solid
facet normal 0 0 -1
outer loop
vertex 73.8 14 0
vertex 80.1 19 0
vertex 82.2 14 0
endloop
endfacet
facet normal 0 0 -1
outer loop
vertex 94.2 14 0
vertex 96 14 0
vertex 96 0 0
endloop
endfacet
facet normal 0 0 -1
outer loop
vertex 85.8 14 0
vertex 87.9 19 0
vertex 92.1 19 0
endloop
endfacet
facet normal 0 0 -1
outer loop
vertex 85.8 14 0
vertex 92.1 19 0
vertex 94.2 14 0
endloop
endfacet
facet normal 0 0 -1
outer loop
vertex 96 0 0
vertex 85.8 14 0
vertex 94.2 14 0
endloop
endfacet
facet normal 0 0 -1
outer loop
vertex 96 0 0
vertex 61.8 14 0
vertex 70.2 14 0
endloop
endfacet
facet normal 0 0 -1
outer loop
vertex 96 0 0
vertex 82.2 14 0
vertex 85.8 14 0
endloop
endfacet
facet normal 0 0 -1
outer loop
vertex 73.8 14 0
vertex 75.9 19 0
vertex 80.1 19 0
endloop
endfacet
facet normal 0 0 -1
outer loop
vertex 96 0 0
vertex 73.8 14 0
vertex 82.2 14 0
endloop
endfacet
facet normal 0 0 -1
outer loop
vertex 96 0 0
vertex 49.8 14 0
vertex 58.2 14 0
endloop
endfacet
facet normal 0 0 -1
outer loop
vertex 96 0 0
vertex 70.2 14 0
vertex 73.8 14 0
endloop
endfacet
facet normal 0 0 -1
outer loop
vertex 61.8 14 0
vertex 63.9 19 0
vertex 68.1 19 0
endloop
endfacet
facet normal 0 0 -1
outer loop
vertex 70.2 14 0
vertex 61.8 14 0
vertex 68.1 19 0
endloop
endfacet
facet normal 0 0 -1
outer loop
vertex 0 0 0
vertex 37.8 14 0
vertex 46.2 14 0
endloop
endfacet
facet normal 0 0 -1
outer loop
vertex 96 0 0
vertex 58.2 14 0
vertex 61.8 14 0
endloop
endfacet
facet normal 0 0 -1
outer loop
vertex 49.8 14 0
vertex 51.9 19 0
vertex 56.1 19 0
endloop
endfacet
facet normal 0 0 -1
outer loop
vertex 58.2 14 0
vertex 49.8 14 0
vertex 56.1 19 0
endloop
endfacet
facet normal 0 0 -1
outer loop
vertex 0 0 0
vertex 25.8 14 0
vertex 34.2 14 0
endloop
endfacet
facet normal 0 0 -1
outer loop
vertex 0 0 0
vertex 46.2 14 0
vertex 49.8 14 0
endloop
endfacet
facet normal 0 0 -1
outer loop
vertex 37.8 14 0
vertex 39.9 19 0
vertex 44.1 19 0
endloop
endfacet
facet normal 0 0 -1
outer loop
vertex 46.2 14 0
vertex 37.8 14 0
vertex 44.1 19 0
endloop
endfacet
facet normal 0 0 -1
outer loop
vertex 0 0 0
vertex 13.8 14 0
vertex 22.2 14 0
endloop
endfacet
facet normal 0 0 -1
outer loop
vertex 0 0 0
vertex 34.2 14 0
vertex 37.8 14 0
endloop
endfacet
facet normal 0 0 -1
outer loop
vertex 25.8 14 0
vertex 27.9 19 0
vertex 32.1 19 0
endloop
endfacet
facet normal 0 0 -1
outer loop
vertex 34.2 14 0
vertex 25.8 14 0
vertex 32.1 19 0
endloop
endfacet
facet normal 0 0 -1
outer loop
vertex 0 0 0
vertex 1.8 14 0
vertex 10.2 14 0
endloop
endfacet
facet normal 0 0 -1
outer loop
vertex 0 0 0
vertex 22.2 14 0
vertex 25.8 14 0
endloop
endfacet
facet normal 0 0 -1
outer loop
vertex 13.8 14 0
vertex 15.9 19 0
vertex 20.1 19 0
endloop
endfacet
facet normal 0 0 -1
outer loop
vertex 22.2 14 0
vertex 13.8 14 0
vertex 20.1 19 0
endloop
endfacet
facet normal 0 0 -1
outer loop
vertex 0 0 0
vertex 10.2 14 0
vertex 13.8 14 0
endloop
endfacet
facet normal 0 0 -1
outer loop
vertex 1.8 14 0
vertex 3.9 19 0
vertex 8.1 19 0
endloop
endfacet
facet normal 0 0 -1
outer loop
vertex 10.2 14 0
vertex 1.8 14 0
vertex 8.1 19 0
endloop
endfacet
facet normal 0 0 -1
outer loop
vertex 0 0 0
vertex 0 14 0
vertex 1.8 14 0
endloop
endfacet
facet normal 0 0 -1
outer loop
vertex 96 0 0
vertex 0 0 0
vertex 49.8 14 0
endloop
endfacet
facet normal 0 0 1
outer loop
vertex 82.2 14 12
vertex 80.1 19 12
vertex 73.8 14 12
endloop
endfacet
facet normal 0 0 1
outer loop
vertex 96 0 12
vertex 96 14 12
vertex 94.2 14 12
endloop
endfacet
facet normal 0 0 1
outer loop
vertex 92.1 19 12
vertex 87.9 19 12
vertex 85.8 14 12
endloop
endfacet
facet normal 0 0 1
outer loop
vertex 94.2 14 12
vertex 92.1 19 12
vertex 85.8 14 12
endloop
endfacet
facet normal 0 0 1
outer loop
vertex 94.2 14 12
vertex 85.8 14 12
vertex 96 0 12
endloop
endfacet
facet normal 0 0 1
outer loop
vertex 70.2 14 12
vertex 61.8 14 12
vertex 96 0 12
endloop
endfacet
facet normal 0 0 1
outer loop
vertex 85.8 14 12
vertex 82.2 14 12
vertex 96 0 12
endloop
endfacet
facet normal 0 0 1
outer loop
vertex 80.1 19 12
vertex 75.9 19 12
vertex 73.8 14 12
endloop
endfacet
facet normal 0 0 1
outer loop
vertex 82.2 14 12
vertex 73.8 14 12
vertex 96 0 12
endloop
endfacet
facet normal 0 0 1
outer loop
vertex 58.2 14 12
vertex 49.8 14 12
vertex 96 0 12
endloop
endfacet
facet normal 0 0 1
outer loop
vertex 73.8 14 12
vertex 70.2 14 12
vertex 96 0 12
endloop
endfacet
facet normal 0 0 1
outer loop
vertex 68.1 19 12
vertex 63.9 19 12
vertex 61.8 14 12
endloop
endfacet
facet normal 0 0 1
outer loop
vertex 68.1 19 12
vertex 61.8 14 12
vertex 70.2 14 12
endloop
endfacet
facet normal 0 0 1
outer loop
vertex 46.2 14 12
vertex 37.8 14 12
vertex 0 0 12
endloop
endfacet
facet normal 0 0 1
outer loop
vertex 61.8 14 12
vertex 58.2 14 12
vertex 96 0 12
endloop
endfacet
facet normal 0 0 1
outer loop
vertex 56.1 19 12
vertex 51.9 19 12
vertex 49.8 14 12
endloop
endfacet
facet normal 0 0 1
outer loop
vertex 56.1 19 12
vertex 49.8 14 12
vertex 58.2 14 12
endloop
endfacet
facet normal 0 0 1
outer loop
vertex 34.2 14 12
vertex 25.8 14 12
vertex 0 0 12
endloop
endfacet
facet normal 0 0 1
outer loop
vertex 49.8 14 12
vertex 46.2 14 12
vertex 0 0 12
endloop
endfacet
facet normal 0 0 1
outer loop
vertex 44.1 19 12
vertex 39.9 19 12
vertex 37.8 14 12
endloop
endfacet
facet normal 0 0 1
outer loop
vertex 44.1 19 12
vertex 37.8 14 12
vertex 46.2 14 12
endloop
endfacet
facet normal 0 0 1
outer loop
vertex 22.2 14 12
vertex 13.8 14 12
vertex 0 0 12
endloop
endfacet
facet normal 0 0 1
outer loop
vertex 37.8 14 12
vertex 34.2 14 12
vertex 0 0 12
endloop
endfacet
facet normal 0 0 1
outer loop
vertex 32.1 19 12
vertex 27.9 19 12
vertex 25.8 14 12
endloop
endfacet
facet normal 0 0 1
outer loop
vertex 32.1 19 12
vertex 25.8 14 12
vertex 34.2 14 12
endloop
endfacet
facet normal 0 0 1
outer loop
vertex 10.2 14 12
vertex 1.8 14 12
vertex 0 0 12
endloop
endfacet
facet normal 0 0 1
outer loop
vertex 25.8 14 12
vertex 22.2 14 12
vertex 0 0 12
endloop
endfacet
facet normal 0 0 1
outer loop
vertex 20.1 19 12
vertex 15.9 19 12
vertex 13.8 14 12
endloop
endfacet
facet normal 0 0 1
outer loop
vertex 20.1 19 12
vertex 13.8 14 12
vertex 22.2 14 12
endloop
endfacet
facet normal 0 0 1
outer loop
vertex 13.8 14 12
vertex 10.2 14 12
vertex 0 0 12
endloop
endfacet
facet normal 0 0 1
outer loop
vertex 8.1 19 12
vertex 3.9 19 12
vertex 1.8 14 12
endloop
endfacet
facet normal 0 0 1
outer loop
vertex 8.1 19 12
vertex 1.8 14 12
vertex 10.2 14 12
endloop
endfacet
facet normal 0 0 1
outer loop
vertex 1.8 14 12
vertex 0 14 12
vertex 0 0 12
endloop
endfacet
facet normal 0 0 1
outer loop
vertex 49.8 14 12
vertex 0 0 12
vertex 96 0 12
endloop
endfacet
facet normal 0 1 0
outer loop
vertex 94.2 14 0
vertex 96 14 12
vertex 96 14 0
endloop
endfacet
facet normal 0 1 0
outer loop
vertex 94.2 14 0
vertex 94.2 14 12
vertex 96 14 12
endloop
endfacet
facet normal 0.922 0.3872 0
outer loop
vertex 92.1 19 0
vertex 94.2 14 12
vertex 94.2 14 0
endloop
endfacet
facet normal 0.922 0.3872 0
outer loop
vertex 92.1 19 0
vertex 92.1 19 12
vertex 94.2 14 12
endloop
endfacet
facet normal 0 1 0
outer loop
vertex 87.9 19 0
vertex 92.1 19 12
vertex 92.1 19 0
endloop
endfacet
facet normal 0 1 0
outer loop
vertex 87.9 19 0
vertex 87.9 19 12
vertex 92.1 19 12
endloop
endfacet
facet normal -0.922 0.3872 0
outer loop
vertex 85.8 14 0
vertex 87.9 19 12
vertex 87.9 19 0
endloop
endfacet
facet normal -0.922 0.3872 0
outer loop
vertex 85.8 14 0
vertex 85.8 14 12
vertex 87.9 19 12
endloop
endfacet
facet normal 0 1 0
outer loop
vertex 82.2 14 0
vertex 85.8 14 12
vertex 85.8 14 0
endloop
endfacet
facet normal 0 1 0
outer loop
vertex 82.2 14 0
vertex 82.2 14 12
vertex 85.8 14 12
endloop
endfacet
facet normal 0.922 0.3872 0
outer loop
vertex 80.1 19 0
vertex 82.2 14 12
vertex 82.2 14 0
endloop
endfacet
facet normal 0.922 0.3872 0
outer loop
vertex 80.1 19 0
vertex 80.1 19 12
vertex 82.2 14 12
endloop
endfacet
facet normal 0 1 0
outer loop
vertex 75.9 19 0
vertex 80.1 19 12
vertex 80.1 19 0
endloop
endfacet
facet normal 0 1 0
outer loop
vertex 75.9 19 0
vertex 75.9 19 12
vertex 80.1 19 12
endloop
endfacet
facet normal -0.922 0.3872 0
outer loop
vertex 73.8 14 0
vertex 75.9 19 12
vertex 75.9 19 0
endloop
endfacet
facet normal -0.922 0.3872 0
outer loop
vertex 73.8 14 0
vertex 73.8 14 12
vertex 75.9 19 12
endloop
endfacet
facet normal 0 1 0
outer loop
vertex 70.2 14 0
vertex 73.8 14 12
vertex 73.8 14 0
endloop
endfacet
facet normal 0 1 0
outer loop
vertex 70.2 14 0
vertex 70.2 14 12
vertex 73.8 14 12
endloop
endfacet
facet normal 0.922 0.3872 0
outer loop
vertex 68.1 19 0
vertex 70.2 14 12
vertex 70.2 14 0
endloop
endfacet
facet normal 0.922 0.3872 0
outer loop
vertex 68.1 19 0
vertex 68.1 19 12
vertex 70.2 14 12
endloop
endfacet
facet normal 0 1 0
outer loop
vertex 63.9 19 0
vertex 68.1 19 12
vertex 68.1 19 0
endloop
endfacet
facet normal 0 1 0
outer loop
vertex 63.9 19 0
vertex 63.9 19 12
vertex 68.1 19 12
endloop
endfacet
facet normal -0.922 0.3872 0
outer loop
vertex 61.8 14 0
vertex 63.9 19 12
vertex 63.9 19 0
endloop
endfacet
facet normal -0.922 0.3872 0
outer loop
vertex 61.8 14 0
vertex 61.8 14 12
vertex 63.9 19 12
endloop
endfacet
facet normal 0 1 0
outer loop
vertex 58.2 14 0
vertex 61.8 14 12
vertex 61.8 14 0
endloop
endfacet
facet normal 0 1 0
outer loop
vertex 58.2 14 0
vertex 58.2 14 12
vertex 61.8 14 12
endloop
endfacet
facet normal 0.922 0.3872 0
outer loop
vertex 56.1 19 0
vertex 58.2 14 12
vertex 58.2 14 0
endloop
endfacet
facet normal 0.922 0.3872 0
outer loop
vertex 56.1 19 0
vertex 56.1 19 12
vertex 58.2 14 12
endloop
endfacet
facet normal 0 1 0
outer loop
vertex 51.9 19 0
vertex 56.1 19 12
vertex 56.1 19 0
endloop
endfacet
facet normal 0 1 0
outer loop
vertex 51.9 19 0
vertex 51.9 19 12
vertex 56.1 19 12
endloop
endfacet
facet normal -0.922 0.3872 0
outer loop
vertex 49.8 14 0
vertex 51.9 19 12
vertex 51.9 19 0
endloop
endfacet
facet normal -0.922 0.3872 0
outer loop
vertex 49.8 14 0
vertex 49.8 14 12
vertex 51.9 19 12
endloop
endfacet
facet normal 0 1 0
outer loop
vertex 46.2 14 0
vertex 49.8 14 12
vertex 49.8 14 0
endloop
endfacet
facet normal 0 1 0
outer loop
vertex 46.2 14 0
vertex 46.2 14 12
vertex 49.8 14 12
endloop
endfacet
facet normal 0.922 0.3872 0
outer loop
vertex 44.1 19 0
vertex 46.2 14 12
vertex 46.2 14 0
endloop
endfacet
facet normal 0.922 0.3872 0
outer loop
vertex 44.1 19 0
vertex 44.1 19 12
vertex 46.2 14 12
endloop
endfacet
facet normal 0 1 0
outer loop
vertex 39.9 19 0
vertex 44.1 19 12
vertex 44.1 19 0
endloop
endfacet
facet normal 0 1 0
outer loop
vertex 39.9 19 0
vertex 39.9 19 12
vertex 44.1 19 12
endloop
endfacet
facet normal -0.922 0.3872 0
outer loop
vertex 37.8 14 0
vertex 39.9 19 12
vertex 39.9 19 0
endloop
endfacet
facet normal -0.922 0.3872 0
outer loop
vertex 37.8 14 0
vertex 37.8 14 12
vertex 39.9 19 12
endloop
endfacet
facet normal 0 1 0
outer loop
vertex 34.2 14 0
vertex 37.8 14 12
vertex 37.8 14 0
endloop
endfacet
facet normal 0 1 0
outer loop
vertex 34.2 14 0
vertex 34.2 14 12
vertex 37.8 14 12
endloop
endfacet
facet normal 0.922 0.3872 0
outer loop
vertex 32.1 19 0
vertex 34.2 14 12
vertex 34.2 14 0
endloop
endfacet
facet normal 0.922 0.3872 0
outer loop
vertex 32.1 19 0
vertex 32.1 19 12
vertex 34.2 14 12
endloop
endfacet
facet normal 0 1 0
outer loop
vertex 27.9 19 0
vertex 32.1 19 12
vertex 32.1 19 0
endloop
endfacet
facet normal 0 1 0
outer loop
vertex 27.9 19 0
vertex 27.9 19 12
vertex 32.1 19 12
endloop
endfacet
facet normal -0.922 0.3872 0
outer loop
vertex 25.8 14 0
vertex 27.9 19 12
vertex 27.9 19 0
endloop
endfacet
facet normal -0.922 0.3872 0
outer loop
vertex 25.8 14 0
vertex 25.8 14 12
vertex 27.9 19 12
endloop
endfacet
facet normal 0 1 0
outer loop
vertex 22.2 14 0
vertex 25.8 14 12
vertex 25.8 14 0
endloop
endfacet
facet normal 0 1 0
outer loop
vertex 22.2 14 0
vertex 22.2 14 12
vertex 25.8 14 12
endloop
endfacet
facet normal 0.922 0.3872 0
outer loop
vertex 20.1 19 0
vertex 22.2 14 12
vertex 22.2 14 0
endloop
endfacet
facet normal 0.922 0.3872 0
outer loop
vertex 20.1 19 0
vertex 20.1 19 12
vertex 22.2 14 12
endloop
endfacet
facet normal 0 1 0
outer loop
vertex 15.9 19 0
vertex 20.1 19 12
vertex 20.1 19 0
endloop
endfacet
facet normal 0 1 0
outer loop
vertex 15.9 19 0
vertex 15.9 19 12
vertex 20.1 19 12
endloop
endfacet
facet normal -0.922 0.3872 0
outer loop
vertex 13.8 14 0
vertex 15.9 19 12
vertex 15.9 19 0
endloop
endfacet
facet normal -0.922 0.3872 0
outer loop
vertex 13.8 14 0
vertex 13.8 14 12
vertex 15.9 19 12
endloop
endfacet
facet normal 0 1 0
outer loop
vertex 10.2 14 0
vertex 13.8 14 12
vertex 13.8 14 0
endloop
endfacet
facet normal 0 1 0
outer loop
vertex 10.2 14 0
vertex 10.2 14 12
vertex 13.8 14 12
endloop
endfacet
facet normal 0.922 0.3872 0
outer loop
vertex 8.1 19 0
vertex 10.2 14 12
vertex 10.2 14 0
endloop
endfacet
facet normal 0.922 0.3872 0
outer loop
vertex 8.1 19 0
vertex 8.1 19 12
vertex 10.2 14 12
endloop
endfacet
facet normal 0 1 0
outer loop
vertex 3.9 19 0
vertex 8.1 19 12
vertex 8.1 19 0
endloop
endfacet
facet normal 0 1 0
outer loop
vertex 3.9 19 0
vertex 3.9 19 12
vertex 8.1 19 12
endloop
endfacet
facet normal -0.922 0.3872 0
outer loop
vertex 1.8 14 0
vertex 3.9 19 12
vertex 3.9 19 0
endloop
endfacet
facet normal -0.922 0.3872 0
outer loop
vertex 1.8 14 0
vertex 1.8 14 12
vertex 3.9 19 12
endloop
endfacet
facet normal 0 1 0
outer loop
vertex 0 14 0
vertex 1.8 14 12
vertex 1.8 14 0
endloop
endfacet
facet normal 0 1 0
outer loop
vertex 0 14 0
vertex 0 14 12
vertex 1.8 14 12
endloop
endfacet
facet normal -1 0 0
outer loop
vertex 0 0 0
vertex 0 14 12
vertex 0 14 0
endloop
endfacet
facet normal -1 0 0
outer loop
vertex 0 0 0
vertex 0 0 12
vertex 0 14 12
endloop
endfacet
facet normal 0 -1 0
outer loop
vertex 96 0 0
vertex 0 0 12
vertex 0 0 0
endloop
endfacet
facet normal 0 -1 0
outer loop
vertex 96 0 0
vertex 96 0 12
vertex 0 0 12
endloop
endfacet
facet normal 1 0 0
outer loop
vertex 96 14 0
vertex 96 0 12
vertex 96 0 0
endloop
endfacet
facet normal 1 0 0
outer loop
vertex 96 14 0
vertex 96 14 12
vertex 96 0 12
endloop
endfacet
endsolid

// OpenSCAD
$fn = 32;

// ----------------------------------------------------------------------
// Gear rack: 8 teeth, pitch 12 mm
// ----------------------------------------------------------------------

// --- parameters (mm) ---
teeth = 8;                // number of teeth
pitch = 12;               // tooth pitch, X
root_w = 8.4;             // tooth width at the root
tip_w = 4.2;              // tooth width at the tip
base_h = 14;              // rack body height, Y
tooth_h = 5;              // tooth height above the body
plate_t = 12;             // rack width, Z (extrusion height)
fit_tol = 0.05;           // declared fit tolerance (prompt contract)
free_tol = 0.2;           // declared free tolerance (prompt contract)

rack_l = teeth * pitch;  // overall length
total_h = base_h + tooth_h;  // overall height

profile = [[0, 0], [96, 0], [96, 14], [94.2, 14], [92.1, 19], [87.9, 19], [85.8, 14], [82.2, 14], [80.1, 19], [75.9, 19], [73.8, 14], [70.2, 14], [68.1, 19], [63.9, 19], [61.8, 14], [58.2, 14], [56.1, 19], [51.9, 19], [49.8, 14], [46.2, 14], [44.1, 19], [39.9, 19], [37.8, 14], [34.2, 14], [32.1, 19], [27.9, 19], [25.8, 14], [22.2, 14], [20.1, 19], [15.9, 19], [13.8, 14], [10.2, 14], [8.1, 19], [3.9, 19], [1.8, 14], [0, 14]];  // primary outline, 36 points, counter clockwise

// --- the one profile operation ---
linear_extrude(height = plate_t) polygon(points = profile);
